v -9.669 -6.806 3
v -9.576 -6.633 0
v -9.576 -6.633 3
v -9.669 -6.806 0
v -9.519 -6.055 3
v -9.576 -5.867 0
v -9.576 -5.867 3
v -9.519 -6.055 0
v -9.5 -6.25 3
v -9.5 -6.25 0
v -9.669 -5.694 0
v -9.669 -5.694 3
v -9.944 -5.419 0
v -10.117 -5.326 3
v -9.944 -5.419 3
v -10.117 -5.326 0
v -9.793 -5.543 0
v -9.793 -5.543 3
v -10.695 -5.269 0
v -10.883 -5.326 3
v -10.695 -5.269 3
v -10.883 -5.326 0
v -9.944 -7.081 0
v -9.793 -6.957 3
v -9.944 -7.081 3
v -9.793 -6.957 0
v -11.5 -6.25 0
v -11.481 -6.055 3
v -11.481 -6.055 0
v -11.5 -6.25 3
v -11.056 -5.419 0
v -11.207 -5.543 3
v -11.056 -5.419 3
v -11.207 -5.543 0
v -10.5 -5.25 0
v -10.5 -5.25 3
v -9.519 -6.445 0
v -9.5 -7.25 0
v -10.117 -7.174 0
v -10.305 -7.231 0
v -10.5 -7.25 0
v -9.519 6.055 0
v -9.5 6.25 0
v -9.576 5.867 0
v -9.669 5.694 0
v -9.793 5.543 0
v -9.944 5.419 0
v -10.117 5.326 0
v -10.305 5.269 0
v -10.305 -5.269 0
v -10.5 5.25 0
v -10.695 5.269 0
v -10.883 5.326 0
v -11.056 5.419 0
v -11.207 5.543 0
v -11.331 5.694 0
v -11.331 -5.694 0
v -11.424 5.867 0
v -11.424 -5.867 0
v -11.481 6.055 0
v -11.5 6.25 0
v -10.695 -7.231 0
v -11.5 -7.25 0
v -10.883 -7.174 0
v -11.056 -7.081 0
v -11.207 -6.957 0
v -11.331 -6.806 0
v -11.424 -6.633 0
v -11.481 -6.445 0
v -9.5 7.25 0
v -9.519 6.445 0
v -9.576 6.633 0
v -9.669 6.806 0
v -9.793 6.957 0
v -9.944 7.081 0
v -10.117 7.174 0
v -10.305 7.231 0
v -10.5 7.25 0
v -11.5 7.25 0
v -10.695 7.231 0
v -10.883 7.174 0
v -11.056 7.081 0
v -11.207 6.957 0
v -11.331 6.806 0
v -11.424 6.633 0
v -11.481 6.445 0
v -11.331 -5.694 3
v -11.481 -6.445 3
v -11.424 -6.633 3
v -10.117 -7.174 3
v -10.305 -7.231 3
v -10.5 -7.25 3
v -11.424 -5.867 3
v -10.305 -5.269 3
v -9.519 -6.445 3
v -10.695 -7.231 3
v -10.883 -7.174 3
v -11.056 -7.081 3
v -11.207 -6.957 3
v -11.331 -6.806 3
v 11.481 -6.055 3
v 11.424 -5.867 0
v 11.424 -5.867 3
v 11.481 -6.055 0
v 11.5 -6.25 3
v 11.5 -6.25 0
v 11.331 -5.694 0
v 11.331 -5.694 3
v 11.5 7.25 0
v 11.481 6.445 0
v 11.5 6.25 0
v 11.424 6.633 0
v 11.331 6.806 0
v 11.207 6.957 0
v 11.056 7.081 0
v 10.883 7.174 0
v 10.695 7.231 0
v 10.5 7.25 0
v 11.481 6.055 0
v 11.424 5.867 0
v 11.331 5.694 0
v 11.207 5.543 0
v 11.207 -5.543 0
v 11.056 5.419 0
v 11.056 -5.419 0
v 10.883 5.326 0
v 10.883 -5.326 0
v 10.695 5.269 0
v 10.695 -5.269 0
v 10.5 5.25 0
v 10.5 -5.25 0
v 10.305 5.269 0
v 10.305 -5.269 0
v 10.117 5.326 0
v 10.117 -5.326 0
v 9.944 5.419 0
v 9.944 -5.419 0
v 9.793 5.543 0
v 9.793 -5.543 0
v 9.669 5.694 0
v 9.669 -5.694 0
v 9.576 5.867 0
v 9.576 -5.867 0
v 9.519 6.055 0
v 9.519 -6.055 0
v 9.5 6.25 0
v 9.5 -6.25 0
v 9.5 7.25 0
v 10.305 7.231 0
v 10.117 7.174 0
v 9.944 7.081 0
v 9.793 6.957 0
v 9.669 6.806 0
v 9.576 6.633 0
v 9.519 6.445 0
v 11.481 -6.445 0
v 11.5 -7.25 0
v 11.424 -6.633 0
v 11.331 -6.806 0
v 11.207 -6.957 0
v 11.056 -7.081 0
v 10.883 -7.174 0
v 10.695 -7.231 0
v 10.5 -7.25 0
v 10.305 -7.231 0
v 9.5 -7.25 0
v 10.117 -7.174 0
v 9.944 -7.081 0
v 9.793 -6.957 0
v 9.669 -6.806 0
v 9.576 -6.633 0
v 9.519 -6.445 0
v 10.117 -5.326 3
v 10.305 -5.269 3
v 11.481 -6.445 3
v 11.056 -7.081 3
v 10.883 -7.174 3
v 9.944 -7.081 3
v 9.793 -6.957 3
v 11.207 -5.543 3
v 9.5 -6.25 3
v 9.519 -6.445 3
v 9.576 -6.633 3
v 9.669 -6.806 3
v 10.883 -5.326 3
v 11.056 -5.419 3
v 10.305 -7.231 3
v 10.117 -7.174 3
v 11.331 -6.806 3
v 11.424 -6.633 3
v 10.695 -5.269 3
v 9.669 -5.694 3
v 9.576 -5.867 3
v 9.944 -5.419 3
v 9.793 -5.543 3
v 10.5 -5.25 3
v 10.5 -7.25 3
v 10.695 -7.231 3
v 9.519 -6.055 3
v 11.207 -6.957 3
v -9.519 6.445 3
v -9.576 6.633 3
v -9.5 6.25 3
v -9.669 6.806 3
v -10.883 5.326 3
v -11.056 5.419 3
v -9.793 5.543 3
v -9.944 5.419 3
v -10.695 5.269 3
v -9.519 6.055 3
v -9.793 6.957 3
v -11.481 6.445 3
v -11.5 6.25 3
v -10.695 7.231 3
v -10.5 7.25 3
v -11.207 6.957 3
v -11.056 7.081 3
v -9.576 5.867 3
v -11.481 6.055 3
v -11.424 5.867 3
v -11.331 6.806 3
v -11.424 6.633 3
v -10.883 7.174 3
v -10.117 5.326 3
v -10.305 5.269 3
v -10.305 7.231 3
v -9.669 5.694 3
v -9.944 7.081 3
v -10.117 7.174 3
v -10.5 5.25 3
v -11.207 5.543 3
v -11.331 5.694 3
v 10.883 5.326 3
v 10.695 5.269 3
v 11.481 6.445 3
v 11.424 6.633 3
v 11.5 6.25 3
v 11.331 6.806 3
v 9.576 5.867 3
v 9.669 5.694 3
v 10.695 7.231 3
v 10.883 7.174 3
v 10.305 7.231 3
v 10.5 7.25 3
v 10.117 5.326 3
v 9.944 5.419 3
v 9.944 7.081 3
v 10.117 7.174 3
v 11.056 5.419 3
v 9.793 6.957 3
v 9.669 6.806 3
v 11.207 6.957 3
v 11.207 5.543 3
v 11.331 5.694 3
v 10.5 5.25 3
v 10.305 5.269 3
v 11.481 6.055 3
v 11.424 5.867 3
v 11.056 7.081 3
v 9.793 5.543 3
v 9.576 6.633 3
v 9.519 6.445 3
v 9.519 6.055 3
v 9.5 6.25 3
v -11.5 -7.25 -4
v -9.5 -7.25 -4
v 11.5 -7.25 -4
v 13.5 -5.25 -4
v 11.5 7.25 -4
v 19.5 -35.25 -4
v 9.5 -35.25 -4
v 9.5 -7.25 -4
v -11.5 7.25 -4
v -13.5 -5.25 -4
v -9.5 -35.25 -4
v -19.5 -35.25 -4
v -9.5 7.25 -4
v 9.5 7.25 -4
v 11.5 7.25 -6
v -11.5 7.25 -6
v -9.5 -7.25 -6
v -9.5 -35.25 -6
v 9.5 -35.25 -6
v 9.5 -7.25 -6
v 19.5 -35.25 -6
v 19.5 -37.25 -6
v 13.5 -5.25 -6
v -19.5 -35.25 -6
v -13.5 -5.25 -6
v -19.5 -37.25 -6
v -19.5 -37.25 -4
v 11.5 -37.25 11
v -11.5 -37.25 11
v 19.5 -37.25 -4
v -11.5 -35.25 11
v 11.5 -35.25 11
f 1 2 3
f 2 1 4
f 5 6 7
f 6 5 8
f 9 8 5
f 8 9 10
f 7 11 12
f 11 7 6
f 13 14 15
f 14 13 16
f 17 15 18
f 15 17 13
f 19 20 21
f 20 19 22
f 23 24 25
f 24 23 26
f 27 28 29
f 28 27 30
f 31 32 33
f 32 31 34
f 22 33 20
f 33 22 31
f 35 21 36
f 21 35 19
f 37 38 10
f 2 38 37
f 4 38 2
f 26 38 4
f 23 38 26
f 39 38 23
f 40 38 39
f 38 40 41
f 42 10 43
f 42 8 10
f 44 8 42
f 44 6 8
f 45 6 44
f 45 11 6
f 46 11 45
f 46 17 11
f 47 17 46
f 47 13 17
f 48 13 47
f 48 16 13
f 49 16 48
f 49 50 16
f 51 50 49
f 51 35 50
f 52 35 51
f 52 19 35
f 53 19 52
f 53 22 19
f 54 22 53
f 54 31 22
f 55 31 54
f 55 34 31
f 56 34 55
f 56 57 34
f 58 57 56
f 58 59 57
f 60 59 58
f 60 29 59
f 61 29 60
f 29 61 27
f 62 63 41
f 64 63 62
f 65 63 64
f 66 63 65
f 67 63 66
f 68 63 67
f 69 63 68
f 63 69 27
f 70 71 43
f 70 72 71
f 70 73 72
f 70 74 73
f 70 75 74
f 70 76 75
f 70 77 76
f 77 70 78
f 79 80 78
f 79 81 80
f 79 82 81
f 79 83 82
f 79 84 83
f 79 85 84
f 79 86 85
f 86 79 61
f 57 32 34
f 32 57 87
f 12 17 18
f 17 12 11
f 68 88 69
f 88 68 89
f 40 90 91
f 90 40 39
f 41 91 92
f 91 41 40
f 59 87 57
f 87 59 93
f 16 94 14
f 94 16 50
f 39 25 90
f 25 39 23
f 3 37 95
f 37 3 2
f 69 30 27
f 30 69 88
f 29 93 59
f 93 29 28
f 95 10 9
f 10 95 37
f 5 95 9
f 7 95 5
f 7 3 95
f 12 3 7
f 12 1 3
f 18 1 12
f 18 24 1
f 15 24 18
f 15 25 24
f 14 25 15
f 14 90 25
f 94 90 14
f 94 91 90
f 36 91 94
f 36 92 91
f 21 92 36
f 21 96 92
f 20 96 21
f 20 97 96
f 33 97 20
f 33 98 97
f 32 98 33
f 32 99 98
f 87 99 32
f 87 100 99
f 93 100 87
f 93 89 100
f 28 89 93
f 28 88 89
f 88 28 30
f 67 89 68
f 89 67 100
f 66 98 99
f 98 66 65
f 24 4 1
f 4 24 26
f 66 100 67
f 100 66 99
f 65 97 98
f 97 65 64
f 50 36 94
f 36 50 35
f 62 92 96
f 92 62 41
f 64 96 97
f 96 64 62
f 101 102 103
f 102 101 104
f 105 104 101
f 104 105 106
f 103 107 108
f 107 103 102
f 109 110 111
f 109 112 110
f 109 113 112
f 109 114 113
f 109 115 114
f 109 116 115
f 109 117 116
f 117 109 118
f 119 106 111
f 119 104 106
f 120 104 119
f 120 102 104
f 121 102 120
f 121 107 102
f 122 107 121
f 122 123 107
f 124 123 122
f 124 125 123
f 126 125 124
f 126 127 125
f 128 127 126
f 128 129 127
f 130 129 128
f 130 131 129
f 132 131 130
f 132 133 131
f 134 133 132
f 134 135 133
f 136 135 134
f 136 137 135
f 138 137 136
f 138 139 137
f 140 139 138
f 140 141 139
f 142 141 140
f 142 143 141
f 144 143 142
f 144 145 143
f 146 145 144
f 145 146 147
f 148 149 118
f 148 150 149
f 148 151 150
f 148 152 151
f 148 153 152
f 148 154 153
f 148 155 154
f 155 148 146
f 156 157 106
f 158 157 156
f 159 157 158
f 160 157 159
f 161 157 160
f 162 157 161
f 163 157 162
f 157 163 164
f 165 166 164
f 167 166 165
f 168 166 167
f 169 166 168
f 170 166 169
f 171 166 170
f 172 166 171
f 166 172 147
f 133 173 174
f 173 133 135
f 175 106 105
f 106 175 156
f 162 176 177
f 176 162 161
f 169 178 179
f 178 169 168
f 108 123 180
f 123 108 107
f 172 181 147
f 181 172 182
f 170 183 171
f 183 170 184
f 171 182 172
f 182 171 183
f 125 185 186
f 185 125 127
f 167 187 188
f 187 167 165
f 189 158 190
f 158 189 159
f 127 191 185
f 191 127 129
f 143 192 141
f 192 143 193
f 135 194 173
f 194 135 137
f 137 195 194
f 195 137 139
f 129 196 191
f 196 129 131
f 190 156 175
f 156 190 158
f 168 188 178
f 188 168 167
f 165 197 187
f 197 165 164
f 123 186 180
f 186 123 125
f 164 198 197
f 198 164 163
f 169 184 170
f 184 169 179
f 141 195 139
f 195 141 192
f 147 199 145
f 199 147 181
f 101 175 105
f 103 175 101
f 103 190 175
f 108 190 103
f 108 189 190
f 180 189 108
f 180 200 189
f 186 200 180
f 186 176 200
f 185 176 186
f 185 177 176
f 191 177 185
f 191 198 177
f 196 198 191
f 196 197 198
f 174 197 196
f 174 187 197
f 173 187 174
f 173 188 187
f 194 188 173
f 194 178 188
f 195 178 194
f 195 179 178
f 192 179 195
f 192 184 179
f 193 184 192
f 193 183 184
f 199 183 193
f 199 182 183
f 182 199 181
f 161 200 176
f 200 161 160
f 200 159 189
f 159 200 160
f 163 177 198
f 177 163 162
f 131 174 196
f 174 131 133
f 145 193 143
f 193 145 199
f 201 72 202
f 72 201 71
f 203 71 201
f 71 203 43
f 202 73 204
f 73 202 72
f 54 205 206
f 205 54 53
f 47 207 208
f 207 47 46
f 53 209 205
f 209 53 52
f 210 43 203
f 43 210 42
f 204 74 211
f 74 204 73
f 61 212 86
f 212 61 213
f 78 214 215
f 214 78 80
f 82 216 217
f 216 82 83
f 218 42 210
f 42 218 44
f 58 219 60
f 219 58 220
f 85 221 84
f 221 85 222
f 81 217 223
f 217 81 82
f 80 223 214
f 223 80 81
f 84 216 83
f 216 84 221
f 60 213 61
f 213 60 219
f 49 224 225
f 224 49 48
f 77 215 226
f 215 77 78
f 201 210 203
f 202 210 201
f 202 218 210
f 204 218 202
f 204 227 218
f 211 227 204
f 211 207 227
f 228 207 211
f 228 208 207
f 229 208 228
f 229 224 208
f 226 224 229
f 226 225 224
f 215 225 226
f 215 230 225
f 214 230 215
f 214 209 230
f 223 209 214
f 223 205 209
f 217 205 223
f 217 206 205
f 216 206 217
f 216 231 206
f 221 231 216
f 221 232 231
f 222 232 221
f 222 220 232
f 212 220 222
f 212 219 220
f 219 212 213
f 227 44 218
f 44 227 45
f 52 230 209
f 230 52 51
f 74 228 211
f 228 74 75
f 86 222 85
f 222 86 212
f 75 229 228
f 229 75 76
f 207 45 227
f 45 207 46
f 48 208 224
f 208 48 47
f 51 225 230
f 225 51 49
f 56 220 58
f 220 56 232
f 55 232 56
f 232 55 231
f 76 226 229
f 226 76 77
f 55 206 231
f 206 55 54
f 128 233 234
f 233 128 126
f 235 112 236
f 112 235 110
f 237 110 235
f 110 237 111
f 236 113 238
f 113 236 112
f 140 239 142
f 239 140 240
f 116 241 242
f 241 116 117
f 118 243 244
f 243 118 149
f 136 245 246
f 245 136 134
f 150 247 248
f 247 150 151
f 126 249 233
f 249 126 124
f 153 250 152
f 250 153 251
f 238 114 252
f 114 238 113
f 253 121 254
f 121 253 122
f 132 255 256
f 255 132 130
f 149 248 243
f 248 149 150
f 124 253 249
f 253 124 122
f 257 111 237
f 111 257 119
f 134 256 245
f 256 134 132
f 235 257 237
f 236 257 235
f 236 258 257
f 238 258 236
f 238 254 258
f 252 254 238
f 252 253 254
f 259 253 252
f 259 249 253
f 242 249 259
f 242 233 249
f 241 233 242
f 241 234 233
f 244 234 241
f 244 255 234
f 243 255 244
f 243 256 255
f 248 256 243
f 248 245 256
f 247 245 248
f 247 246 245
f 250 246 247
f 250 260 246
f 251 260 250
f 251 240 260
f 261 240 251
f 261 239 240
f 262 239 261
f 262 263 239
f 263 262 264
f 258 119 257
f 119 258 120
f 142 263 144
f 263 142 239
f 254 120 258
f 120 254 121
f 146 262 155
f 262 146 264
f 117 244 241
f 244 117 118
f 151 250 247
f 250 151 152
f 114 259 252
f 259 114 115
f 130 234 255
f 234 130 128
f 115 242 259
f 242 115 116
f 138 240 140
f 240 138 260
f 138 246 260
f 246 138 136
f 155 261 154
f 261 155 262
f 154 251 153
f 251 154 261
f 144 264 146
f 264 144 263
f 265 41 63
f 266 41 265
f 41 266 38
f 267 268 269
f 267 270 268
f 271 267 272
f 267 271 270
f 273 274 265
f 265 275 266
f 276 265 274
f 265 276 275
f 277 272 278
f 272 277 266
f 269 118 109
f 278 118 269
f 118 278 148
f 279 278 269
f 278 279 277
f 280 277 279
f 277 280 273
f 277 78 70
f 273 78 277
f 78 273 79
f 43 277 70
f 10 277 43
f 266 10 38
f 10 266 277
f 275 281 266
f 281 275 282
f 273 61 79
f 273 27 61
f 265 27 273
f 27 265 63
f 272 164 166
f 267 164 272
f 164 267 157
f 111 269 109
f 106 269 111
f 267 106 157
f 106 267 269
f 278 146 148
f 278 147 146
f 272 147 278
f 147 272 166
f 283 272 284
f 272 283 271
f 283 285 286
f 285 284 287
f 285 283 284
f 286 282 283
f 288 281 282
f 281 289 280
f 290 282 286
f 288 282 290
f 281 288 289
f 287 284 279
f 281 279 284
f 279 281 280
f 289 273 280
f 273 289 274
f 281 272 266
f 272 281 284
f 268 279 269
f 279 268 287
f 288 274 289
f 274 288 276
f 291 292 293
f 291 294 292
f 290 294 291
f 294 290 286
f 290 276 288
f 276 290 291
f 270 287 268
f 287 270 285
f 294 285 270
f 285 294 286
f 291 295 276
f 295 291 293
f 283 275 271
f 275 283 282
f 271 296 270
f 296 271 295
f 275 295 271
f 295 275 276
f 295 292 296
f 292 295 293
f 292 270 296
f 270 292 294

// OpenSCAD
//
// raspberry pi cameras mount
//
// copyright 2014 Sebastien Roy
// Licence: Public domain
//

/* [General] */

// Reduce the diameter of the pegs (units are 0.01mm, so for 0.1mm enter 10)
tolerance=0; // [0:100]

// to stop customizer
module nop() { }


module centercube(sz) {
	translate(sz/-2) cube(sz);
}

//
// peg: radius of the peg cylinder. Normally 1mm
//
module camera(peg=1.0) {
	// trous
	translate([-21,-12.5,0]/2) cylinder(r=peg,h=3,$fn=32);
	translate([21,-12.5,0]/2) cylinder(r=peg,h=3,$fn=32);
	translate([-21,12.5,0]/2) cylinder(r=peg,h=3,$fn=32);
	translate([21,12.5,0]/2) cylinder(r=peg,h=3,$fn=32);
	// bras
	hull() {
	translate([-21,-12.5,-4]/2) centercube([2,2,4]);
	translate([-21,12.5,-4]/2) centercube([2,2,4]);
	}
	hull() {
	translate([21,-12.5,-4]/2) centercube([2,2,4]);
	translate([21,12.5,-4]/2) centercube([2,2,4]);
	}
	// base
	hull() {
	translate([-21,-12.5,-10]/2-[2,0,0]) centercube([2,2,2]);
	translate([-21,12.5,-10]/2) centercube([2,2,2]);
	translate([21,-12.5,-10]/2+[2,0,0]) centercube([2,2,2]);
	translate([21,12.5,-10]/2) centercube([2,2,2]);
	}
	// patte
	hull() {
	translate([-21-2,-12.5,-10]/2) centercube([4,2,2]);
	translate([-21-8,-12.5,-10]/2-[0,30,0]) centercube([10,2,2]);
	}
	hull() {
	translate([21+2,-12.5,-10]/2) centercube([4,2,2]);
	translate([21+8,-12.5,-10]/2-[0,30,0]) centercube([10,2,2]);
	}
	// plate
	hull() {
	translate([-21-8,-12.5,-10]/2-[0,30,0]) centercube([10,2,2]);
	translate([-21,-12.5,-10]/2-[0,30,-15/2]) centercube([2,2,2+15]);
	translate([21+8,-12.5,-10]/2-[0,30,0]) centercube([10,2,2]);
	translate([21,-12.5,-10]/2-[0,30,-15/2]) centercube([2,2,2+15]);
	}	

}

// call with the radius of the peg
camera(1-tolerance/200);
